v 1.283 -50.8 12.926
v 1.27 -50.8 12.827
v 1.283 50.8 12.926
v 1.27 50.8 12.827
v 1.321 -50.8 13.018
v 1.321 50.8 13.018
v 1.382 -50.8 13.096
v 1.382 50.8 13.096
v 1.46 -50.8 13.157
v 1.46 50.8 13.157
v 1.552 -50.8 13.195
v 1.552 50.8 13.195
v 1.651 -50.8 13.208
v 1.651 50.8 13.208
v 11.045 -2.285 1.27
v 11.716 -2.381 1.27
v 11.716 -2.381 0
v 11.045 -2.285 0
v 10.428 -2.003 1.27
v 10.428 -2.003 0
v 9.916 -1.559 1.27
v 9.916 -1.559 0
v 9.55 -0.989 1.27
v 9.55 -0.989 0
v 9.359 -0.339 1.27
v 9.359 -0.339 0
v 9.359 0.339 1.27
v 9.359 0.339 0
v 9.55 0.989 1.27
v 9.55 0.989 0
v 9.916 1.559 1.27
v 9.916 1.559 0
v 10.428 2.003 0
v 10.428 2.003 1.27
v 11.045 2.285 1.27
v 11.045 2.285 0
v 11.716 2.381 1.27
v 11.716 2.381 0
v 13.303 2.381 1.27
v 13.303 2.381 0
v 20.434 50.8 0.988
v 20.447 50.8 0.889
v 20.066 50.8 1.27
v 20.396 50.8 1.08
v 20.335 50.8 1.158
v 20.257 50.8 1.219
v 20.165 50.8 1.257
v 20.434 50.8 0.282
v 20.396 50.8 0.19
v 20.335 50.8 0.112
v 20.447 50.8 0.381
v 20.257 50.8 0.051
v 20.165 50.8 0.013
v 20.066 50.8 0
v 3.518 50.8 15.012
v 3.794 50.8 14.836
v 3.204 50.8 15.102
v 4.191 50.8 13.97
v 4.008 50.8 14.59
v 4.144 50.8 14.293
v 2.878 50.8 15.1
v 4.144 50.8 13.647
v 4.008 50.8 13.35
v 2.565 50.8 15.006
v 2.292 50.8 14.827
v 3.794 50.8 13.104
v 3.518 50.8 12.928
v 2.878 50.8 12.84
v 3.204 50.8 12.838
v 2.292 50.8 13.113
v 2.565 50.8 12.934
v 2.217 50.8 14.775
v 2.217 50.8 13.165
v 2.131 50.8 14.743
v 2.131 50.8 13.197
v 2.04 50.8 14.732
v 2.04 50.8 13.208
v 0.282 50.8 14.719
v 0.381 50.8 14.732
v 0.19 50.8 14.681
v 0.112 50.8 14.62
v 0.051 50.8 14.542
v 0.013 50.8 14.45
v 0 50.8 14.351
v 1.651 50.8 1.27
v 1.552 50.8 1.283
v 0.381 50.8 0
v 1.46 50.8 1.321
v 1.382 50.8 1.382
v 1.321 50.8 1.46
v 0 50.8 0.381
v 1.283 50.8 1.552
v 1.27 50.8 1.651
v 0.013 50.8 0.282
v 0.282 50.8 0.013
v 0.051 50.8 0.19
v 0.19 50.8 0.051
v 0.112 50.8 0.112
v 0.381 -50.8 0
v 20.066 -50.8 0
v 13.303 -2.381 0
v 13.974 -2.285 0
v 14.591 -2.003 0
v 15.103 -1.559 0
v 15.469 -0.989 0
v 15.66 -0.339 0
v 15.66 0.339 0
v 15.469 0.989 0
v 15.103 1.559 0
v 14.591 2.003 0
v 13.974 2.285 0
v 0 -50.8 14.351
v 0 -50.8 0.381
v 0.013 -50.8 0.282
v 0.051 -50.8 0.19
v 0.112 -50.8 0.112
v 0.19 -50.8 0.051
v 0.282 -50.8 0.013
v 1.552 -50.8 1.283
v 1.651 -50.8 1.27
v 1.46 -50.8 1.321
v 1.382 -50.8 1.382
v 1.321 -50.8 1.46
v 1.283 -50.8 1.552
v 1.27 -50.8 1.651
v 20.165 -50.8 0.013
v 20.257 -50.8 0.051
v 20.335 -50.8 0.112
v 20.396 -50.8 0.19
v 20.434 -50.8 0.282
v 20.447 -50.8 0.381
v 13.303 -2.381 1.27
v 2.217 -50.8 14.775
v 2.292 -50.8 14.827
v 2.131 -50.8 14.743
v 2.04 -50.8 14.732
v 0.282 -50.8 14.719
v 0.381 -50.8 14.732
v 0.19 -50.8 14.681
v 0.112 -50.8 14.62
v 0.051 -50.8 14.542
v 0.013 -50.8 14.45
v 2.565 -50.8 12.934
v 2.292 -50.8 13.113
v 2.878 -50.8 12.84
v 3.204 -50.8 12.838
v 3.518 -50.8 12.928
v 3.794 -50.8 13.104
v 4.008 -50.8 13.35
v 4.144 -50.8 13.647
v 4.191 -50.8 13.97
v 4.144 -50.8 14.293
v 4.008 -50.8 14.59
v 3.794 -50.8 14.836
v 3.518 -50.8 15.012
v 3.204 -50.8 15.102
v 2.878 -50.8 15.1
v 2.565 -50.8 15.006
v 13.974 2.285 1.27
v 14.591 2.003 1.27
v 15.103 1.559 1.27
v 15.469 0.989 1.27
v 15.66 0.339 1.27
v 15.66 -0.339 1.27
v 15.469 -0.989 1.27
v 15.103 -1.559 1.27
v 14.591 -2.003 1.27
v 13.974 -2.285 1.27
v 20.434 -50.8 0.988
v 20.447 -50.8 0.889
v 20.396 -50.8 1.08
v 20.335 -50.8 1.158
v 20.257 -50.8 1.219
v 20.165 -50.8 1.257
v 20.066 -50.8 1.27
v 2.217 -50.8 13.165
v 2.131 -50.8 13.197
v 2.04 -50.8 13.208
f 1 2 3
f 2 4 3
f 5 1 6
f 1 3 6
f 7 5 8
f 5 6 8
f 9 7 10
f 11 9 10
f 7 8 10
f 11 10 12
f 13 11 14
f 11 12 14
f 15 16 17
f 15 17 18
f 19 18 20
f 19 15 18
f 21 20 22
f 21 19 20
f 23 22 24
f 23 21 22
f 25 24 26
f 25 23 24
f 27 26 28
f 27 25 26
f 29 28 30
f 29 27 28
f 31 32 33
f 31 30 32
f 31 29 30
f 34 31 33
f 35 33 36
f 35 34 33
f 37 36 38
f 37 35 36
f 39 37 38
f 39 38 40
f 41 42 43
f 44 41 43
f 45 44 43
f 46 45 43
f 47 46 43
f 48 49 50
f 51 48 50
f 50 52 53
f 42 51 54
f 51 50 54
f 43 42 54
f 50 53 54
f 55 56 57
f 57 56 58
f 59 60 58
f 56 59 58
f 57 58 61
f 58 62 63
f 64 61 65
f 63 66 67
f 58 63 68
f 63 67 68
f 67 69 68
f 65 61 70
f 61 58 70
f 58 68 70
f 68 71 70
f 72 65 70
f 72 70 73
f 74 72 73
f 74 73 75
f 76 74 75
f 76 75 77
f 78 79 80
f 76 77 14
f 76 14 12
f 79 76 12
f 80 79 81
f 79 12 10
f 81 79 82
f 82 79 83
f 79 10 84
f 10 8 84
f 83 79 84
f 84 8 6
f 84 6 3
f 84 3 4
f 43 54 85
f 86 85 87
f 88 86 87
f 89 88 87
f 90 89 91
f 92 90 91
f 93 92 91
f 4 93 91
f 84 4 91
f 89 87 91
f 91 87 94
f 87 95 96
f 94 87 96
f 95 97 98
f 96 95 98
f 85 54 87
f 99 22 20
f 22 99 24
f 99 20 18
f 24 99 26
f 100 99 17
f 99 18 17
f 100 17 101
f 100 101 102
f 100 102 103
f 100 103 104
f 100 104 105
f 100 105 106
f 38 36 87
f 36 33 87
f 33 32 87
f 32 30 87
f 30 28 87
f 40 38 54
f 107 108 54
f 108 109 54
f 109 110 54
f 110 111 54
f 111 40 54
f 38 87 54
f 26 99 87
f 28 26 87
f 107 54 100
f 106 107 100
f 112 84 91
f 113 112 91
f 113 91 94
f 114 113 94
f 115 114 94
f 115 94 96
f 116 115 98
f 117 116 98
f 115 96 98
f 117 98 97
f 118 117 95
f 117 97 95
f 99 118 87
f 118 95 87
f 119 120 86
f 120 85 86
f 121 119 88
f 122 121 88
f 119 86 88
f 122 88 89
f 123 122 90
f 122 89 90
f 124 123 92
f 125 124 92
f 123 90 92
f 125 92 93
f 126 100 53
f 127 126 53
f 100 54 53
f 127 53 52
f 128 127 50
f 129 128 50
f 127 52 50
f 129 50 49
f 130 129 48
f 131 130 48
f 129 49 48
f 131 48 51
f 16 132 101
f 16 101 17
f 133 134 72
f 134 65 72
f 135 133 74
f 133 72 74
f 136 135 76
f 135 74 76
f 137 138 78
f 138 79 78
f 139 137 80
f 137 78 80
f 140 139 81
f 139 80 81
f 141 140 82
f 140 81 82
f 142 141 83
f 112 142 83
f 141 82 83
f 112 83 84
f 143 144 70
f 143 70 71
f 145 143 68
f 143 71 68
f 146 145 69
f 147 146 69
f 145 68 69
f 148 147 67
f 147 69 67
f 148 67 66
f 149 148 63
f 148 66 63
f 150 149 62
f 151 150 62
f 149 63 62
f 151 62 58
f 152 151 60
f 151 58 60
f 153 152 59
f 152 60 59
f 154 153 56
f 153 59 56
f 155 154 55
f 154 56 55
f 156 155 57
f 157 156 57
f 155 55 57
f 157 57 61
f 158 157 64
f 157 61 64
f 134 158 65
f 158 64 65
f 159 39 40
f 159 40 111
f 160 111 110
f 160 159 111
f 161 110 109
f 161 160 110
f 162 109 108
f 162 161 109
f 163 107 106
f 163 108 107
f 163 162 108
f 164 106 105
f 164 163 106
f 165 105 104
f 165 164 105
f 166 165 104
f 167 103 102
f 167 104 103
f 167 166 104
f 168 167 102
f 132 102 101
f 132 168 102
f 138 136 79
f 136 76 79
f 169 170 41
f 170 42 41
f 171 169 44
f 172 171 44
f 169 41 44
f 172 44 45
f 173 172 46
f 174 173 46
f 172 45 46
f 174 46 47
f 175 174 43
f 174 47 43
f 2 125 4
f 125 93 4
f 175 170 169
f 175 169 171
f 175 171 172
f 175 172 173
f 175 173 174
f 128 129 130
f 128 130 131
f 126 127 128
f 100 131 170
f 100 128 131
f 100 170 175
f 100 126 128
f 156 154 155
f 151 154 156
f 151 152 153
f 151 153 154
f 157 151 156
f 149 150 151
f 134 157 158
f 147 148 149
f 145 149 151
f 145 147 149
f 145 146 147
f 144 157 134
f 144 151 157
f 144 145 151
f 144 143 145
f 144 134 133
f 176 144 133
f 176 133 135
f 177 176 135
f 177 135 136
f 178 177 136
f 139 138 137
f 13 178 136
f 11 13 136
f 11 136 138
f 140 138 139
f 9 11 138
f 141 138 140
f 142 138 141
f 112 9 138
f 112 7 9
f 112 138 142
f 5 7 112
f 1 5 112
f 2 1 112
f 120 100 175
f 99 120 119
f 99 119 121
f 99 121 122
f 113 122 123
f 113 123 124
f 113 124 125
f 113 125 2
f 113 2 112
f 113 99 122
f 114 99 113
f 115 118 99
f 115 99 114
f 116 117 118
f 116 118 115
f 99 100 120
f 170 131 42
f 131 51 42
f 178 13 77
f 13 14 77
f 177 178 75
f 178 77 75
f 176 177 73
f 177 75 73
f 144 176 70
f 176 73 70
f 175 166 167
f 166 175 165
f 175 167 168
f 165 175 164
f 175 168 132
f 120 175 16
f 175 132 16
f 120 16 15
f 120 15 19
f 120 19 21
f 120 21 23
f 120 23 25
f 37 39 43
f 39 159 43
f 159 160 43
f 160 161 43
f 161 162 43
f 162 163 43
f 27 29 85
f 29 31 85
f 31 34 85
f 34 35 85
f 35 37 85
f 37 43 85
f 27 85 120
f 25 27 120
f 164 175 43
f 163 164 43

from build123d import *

# Parameters (mm, degrees)
BOSS_EXTRUDE1_DEPTH = 50.8
CUT_EXTRUDE1_DEPTH  = 2.27


with BuildPart() as part:
    # Sketch2 → Boss-Extrude1 (new body, symmetric)
    with BuildSketch(Plane(origin=(0, 0, 0), x_dir=(1, 0, 0), z_dir=(0, 1, 0))):
        with BuildLine():
            Line((0.381, 0), (20.066, 0))
            ThreePointArc((20.066, 0), (20.335407684, -0.111592316), (20.447, -0.381))
            Line((20.447, -0.381), (20.447, -0.889))
            ThreePointArc((20.447, -0.889), (20.335407684, -1.158407684), (20.066, -1.27))
            Line((20.066, -1.27), (1.651, -1.27))
            ThreePointArc((1.651, -1.27), (1.381592316, -1.381592316), (1.27, -1.651))
            Line((1.27, -1.651), (1.27, -12.827))
            ThreePointArc((1.27, -12.827), (1.381592316, -13.096407684), (1.651, -13.208))
            Line((1.651, -13.208), (2.03996875, -13.208))
            ThreePointArc((2.03996875, -13.208), (2.174672592, -13.183392866), (2.291976563, -13.11275))
            ThreePointArc((2.291976563, -13.11275), (4.191, -13.97), (2.291976563, -14.82725))
            ThreePointArc((2.291976563, -14.82725), (2.174672592, -14.756607134), (2.03996875, -14.732))
            Line((2.03996875, -14.732), (0.381, -14.732))
            ThreePointArc((0.381, -14.732), (0.111592316, -14.620407684), (0, -14.351))
            Line((0, -14.351), (0, -0.381))
            ThreePointArc((0, -0.381), (0.111592316, -0.111592316), (0.381, 0))
        make_face()
    extrude(amount=BOSS_EXTRUDE1_DEPTH, both=True)

    # Sketch7 → Cut-Extrude1 (cut, through all)
    with BuildSketch(Plane.XY.offset(1.27)):
        with BuildLine():
            Line((11.71575, 2.38125), (13.30325, 2.38125))
            ThreePointArc((13.30325, 2.38125), (15.6845, 0), (13.30325, -2.38125))
            Line((13.30325, -2.38125), (11.71575, -2.38125))
            ThreePointArc((11.71575, -2.38125), (9.3345, 0), (11.71575, 2.38125))
        make_face()
    extrude(amount=-CUT_EXTRUDE1_DEPTH, mode=Mode.SUBTRACT)


solid = part.part
